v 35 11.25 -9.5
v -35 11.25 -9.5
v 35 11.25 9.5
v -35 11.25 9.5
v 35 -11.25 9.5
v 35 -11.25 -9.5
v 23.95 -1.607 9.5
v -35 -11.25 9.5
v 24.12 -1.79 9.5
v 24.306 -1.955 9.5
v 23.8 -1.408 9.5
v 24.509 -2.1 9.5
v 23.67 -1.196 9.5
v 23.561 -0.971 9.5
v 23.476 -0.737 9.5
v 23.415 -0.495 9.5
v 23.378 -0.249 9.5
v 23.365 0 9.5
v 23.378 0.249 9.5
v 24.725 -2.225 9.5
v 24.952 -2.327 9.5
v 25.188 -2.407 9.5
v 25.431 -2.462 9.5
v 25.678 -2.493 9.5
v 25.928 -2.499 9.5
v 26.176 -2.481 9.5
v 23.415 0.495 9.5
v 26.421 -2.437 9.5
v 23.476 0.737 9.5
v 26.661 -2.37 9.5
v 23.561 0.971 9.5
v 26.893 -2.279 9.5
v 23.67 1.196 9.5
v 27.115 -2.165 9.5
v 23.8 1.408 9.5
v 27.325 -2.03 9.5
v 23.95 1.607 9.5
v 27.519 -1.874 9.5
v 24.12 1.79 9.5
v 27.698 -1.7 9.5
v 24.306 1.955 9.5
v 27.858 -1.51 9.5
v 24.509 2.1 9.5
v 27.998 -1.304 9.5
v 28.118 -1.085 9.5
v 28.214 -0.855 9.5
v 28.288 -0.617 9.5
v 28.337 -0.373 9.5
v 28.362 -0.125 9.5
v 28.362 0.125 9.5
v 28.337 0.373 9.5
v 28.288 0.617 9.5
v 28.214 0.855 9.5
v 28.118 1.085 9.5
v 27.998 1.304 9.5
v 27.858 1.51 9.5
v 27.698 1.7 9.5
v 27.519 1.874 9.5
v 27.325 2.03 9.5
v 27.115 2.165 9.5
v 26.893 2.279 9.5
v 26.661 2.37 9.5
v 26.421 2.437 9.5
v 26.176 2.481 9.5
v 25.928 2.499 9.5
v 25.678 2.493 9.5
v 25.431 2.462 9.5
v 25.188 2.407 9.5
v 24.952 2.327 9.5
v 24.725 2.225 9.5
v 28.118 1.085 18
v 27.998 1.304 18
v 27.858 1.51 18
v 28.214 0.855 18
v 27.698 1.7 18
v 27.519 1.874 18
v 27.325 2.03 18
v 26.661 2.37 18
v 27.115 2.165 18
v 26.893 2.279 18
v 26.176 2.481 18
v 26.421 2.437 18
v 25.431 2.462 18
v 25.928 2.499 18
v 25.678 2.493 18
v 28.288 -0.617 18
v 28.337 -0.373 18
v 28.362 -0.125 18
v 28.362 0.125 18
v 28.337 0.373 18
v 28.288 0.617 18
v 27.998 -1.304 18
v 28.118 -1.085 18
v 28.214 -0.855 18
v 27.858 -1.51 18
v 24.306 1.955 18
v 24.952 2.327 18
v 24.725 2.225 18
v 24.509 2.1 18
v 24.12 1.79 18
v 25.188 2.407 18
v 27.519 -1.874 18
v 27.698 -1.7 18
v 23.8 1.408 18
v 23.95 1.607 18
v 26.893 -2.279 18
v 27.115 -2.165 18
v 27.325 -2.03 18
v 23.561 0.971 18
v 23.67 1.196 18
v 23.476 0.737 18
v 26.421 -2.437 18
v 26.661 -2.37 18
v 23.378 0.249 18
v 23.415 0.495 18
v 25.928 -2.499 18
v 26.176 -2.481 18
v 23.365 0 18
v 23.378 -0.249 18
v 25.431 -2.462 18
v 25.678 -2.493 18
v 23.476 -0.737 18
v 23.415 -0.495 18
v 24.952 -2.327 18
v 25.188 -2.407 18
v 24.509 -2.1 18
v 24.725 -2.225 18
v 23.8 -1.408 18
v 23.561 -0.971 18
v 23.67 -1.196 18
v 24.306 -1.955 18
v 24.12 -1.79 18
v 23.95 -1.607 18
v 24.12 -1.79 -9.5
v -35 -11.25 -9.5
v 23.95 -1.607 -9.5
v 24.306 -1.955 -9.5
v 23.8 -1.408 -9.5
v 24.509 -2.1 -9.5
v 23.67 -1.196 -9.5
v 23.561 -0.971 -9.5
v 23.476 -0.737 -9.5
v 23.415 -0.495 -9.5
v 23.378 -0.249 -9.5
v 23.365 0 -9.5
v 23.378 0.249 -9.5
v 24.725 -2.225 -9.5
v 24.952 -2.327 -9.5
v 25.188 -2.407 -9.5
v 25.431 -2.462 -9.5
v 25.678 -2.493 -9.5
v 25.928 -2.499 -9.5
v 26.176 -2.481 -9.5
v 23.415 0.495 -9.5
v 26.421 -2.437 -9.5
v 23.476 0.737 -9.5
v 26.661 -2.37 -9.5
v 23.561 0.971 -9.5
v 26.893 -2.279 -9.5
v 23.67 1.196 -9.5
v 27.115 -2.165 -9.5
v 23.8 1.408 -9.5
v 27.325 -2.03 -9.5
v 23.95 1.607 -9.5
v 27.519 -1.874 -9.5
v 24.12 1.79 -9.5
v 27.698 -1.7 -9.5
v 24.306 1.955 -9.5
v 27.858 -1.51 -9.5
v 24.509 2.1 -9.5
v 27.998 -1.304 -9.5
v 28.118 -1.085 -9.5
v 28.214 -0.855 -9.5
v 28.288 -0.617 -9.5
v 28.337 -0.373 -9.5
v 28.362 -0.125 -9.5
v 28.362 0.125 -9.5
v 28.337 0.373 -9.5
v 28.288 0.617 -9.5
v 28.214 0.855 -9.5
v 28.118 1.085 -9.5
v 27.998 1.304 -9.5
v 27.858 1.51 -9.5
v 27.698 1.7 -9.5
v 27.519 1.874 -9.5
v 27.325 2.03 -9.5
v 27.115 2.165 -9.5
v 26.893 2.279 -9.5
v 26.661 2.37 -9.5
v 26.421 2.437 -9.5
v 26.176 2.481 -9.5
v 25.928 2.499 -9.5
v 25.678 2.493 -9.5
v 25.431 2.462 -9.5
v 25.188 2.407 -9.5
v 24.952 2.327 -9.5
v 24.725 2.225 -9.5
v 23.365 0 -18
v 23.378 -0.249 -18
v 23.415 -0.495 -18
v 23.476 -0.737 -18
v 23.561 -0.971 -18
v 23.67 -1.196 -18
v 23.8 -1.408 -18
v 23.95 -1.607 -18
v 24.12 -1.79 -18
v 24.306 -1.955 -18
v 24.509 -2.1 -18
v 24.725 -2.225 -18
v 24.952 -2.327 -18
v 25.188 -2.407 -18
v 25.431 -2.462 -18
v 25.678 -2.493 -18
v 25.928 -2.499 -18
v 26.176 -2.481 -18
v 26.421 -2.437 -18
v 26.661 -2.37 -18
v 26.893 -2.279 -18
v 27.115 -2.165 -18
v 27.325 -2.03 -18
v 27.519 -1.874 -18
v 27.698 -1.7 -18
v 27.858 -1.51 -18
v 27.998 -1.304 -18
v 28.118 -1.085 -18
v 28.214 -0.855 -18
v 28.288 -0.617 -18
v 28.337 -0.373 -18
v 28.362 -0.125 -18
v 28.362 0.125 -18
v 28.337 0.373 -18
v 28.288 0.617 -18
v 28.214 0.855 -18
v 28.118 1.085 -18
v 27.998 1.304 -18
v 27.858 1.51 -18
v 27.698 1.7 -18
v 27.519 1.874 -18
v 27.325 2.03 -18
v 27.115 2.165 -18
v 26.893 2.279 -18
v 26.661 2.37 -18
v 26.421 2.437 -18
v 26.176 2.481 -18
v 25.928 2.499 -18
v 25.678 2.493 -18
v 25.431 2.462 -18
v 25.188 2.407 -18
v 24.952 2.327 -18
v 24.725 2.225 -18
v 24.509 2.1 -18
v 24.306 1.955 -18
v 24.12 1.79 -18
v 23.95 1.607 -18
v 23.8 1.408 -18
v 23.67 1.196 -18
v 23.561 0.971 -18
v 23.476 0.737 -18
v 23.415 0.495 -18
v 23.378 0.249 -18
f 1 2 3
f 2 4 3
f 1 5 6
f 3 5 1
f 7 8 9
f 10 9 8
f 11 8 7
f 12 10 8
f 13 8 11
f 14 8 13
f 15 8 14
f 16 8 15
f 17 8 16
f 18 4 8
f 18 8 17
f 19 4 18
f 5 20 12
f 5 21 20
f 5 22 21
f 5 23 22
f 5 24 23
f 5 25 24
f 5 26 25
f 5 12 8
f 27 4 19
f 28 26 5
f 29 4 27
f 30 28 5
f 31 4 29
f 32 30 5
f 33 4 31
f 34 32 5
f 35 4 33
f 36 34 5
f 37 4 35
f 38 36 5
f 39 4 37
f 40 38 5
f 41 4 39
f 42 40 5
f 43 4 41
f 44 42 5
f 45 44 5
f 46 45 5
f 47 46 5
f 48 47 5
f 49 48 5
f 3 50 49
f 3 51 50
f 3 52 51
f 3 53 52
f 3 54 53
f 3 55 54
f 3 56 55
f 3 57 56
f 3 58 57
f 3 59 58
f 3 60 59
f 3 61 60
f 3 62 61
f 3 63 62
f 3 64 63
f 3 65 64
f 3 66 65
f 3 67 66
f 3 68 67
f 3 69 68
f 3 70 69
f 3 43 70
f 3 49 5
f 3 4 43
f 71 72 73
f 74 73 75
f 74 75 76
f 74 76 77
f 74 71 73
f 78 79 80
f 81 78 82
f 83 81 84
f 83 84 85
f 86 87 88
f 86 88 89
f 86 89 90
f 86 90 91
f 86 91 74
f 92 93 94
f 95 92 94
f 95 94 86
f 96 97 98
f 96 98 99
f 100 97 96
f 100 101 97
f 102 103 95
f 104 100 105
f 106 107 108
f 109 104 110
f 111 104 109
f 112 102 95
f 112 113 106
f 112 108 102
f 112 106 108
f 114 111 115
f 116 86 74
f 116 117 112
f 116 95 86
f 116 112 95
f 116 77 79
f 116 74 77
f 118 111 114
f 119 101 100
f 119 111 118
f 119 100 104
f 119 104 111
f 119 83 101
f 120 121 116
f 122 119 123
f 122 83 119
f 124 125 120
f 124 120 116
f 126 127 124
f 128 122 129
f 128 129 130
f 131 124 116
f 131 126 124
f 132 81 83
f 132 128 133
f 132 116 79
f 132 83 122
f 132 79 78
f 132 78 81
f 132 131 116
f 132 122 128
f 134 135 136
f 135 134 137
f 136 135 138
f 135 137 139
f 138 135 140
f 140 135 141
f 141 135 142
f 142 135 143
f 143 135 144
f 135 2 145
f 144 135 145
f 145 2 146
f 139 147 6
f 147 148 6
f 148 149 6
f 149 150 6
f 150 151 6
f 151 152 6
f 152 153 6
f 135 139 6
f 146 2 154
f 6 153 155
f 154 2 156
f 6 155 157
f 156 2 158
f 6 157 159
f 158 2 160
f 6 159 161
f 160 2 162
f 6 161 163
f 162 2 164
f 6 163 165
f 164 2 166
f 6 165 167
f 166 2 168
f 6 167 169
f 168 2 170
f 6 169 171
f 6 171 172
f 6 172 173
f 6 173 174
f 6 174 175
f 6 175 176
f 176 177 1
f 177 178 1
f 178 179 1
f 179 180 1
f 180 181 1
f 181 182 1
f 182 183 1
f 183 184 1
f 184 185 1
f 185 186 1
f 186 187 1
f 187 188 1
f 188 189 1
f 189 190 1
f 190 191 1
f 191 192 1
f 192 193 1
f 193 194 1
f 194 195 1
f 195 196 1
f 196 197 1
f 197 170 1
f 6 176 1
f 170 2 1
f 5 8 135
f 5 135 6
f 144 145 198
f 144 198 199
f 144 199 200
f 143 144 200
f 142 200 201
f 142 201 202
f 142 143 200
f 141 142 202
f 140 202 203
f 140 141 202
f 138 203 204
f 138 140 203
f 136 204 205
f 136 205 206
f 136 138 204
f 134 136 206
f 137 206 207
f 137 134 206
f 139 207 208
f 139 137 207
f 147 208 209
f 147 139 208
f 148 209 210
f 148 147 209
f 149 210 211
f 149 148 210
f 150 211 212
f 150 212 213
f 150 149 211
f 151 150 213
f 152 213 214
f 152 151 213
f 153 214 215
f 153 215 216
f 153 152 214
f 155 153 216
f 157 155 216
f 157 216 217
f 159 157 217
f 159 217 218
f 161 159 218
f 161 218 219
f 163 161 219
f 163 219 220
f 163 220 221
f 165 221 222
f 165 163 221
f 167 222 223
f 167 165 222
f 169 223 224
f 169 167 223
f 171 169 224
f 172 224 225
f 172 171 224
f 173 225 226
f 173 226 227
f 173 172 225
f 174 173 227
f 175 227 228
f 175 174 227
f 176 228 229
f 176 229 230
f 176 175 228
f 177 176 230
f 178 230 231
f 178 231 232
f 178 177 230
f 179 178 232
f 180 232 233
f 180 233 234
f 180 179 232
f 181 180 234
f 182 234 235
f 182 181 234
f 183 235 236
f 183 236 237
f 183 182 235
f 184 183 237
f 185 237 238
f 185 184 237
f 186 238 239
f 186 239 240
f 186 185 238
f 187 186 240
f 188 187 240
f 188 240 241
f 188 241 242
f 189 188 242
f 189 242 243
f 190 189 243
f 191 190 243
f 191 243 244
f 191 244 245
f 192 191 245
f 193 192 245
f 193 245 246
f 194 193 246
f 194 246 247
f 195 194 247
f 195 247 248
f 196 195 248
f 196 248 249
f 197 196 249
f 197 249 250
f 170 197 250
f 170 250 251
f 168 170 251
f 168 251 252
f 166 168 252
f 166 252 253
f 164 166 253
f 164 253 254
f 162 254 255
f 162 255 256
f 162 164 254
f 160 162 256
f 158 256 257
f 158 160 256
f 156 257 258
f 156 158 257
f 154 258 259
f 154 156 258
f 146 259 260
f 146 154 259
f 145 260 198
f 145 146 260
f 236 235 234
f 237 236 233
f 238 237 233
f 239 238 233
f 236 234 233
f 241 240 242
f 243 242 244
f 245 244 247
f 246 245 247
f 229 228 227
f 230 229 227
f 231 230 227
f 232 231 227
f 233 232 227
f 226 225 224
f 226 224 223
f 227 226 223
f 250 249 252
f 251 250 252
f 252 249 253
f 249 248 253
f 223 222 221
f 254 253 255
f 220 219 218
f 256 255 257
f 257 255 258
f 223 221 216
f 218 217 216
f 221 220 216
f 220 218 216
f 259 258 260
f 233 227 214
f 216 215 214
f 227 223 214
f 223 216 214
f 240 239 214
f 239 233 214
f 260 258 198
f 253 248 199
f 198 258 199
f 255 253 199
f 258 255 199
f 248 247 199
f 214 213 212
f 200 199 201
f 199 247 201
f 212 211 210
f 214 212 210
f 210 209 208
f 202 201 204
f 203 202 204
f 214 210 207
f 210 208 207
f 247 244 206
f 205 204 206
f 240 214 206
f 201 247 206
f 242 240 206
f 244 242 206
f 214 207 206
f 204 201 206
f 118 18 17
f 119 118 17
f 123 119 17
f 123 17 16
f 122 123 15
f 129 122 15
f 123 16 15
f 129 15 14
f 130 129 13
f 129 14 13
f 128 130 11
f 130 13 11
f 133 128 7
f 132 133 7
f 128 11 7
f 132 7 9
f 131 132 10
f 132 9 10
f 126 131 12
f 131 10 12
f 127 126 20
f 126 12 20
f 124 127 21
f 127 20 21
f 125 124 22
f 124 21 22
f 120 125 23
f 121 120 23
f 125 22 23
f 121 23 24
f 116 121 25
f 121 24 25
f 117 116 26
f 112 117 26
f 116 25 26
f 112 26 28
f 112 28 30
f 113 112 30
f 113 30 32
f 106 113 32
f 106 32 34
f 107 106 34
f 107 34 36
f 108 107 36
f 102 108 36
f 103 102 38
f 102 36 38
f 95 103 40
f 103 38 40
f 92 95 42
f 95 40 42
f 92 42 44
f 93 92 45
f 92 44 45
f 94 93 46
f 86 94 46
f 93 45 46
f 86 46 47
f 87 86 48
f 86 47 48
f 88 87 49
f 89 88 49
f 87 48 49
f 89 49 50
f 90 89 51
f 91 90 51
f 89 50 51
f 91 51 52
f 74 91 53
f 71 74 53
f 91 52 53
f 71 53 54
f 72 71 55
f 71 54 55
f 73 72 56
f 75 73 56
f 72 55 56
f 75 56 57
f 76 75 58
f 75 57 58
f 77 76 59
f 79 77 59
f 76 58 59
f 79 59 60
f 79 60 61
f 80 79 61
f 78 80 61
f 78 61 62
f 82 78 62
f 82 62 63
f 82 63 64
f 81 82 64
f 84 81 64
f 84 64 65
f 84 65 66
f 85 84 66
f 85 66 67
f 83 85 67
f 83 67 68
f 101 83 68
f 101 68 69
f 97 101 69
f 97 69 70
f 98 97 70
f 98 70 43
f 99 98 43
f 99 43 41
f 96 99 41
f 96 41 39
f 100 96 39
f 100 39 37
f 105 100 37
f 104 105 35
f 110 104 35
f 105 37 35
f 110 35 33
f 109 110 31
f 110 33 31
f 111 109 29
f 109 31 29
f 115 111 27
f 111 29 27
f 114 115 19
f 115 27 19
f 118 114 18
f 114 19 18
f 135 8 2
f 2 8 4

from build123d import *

# Parameters (mm, degrees)
SKETCH_1_W      = 70
SKETCH_1_H      = 22.5
EXTRUDE_1_DEPTH = 9.5
SKETCH_2_R      = 2.5
EXTRUDE_2_DEPTH = 8.5


with BuildPart() as part:
    # 草图1 → 凸台-拉伸1 (new, symmetric)
    with BuildSketch(Plane.XY):
        Rectangle(SKETCH_1_W, SKETCH_1_H)
    extrude(amount=EXTRUDE_1_DEPTH, both=True)

    # 草图2 → 凸台-拉伸2 (add)
    with BuildSketch(Plane.XY.offset(9.5)):
        with Locations(Location((25.865182866, 0, 0), (0, 0, 180))):
            Circle(SKETCH_2_R)
    extrude_2 = extrude(amount=EXTRUDE_2_DEPTH)

    # 镜向1: 凸台-拉伸2 across plane
    add(extrude_2.mirror(Plane.XY))


solid = part.part
